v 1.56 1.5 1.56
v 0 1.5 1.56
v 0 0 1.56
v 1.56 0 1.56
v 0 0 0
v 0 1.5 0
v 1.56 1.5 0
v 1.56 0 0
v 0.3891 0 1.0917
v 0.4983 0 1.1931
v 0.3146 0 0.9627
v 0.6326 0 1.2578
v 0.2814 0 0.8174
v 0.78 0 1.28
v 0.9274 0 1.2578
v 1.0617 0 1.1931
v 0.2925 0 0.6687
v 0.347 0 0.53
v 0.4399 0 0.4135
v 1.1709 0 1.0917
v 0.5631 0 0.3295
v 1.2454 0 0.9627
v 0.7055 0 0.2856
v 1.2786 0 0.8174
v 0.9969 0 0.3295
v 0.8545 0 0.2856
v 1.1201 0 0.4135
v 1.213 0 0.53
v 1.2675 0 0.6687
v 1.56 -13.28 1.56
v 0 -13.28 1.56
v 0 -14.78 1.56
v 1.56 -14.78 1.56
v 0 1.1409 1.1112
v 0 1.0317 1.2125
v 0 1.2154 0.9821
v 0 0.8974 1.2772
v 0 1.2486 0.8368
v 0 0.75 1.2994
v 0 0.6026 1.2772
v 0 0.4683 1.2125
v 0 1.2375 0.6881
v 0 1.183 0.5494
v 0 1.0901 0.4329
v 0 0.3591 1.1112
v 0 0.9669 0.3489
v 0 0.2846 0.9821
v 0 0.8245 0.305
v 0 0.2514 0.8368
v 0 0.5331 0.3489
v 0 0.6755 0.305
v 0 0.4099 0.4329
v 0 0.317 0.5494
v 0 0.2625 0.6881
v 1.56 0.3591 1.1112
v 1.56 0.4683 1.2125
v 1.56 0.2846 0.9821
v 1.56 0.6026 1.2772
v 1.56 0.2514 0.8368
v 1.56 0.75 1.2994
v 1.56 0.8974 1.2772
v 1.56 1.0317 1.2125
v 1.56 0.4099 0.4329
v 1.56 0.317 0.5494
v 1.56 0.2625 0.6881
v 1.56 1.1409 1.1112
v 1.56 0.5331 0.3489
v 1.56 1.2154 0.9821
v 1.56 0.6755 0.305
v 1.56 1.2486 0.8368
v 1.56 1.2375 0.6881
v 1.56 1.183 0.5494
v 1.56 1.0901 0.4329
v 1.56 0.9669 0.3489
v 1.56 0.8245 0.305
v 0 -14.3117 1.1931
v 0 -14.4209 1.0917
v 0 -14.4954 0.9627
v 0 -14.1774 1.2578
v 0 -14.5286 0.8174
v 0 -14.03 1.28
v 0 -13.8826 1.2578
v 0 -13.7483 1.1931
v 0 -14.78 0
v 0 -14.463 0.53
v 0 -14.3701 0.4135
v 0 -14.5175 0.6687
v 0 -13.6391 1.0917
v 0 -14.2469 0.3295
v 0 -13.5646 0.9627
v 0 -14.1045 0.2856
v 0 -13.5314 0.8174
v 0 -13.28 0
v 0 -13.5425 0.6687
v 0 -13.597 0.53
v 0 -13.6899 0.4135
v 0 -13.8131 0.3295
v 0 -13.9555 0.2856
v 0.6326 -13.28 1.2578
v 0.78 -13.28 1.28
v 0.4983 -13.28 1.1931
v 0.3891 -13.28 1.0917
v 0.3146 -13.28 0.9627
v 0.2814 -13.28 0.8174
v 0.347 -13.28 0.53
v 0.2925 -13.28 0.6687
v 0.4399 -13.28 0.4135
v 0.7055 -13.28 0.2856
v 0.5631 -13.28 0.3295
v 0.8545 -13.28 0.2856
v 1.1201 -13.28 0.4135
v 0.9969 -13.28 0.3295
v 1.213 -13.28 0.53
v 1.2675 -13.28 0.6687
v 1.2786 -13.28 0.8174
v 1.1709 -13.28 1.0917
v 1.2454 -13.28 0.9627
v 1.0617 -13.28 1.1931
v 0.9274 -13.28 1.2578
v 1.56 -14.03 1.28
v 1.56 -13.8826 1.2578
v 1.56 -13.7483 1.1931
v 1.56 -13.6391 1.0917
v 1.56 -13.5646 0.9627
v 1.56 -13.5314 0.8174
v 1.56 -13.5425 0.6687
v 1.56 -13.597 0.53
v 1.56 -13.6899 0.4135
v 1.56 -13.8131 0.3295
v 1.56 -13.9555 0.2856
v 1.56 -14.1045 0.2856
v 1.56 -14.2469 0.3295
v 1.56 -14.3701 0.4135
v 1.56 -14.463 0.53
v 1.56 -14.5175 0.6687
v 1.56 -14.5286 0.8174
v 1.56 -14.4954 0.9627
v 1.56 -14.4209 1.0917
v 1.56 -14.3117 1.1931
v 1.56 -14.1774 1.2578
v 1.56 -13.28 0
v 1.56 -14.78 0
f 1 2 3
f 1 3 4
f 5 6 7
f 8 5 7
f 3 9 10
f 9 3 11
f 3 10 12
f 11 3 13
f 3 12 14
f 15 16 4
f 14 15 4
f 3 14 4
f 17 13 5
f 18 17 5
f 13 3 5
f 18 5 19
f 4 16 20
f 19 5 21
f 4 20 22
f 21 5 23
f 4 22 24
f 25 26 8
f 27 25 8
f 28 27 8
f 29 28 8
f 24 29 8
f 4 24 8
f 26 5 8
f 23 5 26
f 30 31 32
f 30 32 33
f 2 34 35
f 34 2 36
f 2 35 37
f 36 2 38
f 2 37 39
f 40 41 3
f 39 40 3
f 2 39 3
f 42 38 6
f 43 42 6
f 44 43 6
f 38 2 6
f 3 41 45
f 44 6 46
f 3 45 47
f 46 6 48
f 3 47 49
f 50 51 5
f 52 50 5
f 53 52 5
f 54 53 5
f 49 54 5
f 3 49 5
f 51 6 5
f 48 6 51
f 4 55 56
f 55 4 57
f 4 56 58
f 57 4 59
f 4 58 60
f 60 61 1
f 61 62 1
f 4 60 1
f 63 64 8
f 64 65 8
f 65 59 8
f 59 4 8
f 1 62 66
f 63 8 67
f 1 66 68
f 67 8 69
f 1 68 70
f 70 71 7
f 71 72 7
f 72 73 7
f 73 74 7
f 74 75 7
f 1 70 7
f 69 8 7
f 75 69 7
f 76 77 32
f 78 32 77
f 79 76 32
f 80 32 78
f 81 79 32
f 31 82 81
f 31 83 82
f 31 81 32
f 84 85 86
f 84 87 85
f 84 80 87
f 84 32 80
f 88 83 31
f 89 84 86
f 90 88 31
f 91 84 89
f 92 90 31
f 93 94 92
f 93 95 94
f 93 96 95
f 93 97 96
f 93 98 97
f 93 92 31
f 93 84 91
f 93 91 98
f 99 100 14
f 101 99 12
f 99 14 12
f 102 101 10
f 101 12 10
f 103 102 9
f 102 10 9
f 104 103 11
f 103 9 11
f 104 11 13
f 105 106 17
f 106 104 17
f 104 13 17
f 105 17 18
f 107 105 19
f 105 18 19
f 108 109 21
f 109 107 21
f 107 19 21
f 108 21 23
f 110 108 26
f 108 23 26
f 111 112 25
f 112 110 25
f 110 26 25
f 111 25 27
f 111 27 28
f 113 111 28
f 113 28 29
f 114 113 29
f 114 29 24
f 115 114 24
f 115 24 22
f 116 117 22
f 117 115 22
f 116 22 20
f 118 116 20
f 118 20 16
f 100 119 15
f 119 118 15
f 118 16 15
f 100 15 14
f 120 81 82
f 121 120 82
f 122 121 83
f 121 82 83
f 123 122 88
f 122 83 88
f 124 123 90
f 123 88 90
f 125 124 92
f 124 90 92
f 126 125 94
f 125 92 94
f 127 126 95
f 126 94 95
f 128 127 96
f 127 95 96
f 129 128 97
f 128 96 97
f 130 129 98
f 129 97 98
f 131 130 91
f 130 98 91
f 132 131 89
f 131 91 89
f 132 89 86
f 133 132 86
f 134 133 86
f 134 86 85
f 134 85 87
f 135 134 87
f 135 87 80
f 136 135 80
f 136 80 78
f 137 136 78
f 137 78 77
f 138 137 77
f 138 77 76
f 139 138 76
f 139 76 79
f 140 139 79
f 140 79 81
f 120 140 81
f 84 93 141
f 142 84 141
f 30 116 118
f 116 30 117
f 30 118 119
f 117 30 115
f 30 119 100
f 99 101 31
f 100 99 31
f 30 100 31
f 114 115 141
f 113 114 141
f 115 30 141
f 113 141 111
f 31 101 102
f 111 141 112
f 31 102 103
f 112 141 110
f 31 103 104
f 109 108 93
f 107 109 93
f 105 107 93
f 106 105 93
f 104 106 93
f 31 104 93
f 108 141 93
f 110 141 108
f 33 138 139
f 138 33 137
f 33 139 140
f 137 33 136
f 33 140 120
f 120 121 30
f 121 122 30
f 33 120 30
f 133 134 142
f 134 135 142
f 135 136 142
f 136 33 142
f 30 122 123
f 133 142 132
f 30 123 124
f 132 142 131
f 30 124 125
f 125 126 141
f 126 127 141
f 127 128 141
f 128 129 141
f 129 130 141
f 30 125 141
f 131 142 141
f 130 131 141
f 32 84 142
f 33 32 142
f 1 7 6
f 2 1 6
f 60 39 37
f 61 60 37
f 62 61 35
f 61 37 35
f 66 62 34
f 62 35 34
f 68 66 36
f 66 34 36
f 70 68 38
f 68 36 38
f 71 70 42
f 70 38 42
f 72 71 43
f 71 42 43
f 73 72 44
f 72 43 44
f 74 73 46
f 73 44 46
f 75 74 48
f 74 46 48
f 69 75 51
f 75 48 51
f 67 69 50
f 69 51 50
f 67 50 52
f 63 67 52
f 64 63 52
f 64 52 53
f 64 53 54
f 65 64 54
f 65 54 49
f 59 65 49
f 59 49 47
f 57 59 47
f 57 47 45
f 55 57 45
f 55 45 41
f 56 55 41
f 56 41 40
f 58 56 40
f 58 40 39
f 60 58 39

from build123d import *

# Parameters (mm, degrees)
SKETCH2_W           = 0.78
SKETCH2_H           = 1.5
SKETCH2_H_2         = 0.75
BOSS_EXTRUDE1_DEPTH = 1.56
SKETCH3_R           = 0.5
BOSS_EXTRUDE2_DEPTH = 14
SKETCH4_R           = 0.5
CUT_EXTRUDE1_DEPTH  = 14
SKETCH5_R           = 0.5
CUT_EXTRUDE2_DEPTH  = 14


with BuildPart() as part:
    # Sketch2 → Boss-Extrude1 (new body)
    with BuildSketch(Plane.XY):
        with Locations((0.39, -14.03)):
            Rectangle(SKETCH2_W, SKETCH2_H)
        with Locations((1.17, -14.03)):
            Rectangle(SKETCH2_W, SKETCH2_H)
        Polygon((0, 1.5), (0, 0.75), (0.78, 0.75), (0.78, 0), (1.56, 0), (1.56, 1.5), align=None)
        with Locations((0.39, 0.375)):
            Rectangle(SKETCH2_W, SKETCH2_H_2)
    extrude(amount=BOSS_EXTRUDE1_DEPTH)

    # Sketch3 → Boss-Extrude2 (add)
    with BuildSketch(Plane.XZ):
        with Locations(Location((0.78, 0.78, 0), (0, 0, 90))):
            Circle(SKETCH3_R)
    extrude(amount=BOSS_EXTRUDE2_DEPTH)

    # Sketch4 → Cut-Extrude1 (cut)
    with BuildSketch(Plane.ZY):
        with Locations((0.799406884, 0.75)):
            Circle(SKETCH4_R)
    extrude(amount=-CUT_EXTRUDE1_DEPTH, mode=Mode.SUBTRACT)

    # Sketch5 → Cut-Extrude2 (cut)
    with BuildSketch(Plane.ZY):
        with Locations((0.78, -14.03)):
            Circle(SKETCH5_R)
    extrude(amount=-CUT_EXTRUDE2_DEPTH, mode=Mode.SUBTRACT)


solid = part.part
